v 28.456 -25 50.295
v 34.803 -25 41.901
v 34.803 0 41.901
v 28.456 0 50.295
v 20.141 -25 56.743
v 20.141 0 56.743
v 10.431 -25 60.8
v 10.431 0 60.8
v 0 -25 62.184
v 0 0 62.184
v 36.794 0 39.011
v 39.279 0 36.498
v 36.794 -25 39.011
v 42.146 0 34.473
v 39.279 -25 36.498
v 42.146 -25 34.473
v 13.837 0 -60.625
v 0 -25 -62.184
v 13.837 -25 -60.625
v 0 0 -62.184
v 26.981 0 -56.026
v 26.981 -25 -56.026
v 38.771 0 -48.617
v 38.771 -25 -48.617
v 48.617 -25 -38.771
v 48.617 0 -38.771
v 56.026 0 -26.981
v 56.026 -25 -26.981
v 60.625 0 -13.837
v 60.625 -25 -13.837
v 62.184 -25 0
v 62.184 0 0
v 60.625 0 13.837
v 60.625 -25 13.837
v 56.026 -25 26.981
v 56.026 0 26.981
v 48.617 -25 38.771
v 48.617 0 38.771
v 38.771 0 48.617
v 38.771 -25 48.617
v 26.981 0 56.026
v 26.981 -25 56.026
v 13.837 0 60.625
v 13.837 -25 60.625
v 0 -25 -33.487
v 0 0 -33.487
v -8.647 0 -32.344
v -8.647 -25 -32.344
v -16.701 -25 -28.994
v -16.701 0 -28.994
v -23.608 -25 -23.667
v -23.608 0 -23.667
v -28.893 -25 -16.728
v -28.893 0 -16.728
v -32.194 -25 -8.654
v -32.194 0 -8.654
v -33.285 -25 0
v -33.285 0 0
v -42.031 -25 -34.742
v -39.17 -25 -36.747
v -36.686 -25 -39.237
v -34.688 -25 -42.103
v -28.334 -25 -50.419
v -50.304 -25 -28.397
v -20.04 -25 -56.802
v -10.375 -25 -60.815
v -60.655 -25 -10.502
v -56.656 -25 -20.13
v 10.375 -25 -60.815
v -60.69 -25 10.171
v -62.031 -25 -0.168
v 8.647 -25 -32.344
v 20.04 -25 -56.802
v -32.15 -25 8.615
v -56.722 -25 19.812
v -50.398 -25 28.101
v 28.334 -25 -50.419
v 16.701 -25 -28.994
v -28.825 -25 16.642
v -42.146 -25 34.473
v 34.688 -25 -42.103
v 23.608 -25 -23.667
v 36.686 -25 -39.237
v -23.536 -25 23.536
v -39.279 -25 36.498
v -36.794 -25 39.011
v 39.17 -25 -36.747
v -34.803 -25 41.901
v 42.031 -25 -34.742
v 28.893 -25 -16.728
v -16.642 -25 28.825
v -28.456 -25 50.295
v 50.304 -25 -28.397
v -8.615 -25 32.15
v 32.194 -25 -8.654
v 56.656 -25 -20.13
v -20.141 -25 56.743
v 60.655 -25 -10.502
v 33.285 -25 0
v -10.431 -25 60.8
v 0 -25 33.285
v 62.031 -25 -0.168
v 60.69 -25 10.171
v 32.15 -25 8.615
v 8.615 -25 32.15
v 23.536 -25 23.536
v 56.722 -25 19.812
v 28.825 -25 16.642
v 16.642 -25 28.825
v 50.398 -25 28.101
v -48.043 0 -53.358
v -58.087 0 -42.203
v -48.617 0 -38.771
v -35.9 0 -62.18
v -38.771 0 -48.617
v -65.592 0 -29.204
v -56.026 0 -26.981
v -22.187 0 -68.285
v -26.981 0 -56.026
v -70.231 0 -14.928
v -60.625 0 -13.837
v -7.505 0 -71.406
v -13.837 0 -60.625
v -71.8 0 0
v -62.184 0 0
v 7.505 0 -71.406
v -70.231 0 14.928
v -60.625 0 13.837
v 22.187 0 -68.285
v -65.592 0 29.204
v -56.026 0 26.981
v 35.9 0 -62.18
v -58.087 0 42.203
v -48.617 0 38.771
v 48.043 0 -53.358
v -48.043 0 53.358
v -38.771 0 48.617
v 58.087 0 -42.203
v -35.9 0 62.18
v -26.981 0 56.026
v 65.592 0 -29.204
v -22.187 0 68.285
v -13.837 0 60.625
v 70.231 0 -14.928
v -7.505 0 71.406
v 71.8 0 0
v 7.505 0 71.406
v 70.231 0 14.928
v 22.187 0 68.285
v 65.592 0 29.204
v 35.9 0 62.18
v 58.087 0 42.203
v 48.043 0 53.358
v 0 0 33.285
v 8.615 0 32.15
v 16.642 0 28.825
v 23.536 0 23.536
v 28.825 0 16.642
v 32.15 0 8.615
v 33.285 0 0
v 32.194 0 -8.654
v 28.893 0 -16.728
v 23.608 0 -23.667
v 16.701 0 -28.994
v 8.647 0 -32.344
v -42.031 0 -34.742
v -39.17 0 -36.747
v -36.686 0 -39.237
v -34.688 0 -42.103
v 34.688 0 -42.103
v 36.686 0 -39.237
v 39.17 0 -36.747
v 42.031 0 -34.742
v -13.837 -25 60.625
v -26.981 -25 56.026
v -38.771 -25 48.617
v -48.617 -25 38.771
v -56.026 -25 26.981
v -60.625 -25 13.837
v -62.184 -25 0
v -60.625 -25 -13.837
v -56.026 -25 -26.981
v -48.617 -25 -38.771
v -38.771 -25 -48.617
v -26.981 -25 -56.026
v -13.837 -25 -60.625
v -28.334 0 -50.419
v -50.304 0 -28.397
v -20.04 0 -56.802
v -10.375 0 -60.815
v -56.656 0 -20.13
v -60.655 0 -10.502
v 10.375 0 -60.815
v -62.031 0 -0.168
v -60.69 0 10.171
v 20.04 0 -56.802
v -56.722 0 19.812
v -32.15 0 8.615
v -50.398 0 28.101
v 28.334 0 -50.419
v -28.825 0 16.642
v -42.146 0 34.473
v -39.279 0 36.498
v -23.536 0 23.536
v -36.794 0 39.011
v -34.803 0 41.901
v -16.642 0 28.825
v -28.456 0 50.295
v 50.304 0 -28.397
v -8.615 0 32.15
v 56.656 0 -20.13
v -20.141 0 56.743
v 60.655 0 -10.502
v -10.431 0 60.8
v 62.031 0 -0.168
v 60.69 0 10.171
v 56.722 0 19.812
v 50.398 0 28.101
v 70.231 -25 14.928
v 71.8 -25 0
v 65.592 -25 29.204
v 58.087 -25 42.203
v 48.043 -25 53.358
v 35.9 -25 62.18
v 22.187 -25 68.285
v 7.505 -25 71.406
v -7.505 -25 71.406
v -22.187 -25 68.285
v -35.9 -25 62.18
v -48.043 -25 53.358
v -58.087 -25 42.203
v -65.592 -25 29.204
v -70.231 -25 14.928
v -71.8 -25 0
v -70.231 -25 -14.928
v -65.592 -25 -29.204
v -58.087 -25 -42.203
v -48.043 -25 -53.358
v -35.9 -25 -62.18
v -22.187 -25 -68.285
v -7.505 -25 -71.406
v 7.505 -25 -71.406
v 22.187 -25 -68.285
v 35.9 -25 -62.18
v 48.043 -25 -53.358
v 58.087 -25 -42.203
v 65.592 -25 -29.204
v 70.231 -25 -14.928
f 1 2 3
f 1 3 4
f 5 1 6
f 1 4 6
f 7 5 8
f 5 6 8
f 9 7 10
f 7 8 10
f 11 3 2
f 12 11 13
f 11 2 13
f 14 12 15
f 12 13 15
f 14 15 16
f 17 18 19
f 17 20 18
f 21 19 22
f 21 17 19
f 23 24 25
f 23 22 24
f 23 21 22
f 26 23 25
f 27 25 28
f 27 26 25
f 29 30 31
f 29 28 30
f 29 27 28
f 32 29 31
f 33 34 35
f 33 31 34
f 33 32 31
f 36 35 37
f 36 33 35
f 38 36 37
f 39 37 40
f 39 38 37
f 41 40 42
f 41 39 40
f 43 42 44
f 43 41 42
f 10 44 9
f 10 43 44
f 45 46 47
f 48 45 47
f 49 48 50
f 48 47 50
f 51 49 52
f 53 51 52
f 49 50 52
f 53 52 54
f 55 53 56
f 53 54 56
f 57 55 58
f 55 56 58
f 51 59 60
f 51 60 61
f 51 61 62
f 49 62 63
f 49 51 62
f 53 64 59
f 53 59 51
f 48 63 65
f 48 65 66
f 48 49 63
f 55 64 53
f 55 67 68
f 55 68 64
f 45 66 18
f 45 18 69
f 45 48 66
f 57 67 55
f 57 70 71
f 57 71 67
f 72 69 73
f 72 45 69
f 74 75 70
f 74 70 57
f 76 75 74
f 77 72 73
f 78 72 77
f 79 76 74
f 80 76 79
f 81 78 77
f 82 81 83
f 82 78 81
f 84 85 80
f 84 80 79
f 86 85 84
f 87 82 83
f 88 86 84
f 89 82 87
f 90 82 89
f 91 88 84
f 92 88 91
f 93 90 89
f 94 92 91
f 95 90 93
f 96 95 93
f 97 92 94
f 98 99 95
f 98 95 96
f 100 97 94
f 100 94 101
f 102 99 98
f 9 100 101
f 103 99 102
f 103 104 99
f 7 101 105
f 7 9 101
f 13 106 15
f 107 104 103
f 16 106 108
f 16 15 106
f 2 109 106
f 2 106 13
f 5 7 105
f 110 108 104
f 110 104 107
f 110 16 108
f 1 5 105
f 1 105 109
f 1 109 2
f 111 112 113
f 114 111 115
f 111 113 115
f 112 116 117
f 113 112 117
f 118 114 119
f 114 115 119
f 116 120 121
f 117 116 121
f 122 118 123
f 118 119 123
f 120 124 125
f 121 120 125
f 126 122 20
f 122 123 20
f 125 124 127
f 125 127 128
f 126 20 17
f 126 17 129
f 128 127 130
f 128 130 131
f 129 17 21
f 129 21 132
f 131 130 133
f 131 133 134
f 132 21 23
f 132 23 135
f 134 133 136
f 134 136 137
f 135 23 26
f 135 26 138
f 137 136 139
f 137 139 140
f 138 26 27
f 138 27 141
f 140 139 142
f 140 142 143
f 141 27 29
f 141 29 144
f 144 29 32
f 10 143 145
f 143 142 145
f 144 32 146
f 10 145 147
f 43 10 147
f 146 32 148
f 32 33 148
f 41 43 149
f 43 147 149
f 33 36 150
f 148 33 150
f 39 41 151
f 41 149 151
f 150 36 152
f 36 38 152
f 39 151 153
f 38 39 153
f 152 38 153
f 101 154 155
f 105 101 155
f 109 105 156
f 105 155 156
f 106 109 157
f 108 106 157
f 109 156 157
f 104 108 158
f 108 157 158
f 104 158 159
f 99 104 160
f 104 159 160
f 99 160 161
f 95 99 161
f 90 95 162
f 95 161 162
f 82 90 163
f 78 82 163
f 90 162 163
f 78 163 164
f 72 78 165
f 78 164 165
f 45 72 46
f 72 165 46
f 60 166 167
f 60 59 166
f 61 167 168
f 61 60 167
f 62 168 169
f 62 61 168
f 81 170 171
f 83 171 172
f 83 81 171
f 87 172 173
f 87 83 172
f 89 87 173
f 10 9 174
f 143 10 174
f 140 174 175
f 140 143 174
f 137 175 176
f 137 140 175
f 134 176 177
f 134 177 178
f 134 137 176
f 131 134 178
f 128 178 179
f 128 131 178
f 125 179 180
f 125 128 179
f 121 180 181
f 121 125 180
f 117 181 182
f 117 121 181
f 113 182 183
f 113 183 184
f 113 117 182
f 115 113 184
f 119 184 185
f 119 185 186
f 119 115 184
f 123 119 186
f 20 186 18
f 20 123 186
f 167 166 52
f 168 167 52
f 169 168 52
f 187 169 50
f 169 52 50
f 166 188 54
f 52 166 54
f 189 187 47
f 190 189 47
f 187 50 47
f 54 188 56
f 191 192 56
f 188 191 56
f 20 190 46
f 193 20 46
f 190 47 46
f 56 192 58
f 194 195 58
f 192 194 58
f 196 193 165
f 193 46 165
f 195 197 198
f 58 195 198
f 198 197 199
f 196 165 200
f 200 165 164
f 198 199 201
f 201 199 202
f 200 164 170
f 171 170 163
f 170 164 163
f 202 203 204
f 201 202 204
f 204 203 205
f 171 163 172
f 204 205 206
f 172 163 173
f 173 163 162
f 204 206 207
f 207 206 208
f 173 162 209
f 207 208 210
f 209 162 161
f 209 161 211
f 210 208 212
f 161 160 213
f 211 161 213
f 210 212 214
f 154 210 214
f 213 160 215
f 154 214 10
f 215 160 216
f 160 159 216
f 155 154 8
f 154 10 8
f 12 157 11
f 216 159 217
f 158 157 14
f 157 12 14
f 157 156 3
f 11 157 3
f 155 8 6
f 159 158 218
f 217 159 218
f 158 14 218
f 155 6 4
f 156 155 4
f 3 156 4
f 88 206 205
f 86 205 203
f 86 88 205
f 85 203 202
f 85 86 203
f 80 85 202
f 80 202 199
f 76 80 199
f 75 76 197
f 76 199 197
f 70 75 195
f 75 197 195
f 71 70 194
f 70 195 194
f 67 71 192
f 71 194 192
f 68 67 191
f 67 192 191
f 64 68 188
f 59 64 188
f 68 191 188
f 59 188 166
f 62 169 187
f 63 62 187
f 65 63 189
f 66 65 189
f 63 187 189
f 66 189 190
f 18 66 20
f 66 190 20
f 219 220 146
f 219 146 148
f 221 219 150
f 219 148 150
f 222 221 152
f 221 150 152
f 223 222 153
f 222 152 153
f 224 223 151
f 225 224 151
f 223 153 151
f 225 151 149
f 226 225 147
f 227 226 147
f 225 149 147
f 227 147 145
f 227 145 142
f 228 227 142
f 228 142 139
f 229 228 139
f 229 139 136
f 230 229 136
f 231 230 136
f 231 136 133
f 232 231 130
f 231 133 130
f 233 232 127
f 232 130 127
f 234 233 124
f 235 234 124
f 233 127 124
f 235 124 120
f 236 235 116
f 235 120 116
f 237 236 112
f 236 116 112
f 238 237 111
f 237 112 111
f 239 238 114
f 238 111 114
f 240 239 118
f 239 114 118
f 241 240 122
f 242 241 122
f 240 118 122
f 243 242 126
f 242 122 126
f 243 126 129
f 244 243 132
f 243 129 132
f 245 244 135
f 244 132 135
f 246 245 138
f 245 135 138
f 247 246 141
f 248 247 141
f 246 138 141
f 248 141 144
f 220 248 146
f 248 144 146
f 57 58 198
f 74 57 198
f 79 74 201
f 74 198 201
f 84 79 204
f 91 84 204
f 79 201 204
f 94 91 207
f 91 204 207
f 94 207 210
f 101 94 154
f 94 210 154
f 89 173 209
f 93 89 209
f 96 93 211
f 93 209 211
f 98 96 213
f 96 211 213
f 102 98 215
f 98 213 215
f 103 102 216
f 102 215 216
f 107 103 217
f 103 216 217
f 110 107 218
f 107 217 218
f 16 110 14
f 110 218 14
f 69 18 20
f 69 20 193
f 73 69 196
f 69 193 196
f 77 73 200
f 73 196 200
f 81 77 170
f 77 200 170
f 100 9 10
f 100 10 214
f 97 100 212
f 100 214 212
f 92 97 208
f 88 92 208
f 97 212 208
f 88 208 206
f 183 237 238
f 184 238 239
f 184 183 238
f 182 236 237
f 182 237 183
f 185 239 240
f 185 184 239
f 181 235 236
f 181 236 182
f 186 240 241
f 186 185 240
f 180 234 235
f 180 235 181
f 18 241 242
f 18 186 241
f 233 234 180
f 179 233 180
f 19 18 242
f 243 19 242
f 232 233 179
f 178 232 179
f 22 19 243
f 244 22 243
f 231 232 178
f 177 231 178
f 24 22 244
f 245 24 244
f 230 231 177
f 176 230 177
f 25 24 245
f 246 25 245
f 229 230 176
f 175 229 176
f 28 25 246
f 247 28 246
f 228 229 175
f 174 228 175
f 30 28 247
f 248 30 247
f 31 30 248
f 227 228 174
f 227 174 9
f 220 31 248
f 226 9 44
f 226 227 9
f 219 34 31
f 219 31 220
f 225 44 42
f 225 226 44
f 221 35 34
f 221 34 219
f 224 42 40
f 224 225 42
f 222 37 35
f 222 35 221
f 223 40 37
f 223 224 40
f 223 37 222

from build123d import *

# Parameters (mm, degrees)
F1_DEPTH = 25
F2_R     = 20
F3_R     = 71.7996081042
F3_R_2   = 62.1840589354
F4_DEPTH = 25


with BuildPart() as f1:
    # F0 (on Front) → F1 (new body)
    with BuildSketch(Plane.XZ):
        with BuildLine():
            ThreePointArc((37.0915824755, -37.1578530257), (39.7917054819, -18.10727407), (33.2846440443, 0))
            ThreePointArc((33.2846440443, 0), (23.6075322928, -23.6666891703), (0, -33.4872333087))
            ThreePointArc((0, -33.4872333087), (18.0921230956, -39.9068560653), (37.0915824755, -37.1578530257))
        make_face()
        with BuildLine():
            ThreePointArc((0, 33.2846440443), (23.5357975131, 23.5357975131), (33.2846440443, 0))
            ThreePointArc((33.2846440443, 0), (39.7782077768, 17.977613159), (37.1883942733, 36.915770695))
            ThreePointArc((37.1883942733, 36.915770695), (18.1441509794, 39.7093812016), (0, 33.2846440443))
        make_face()
        with BuildLine():
            ThreePointArc((37.1883942733, 36.915770695), (39.7782077768, 17.977613159), (33.2846440443, 0))
            ThreePointArc((33.2846440443, 0), (39.7917054819, -18.10727407), (37.0915824755, -37.1578530257))
            ThreePointArc((37.0915824755, -37.1578530257), (62.0312866935, -0.1535732762), (37.1883942733, 36.915770695))
        make_face()
        with BuildLine():
            ThreePointArc((-37.1883942733, 36.915770695), (-18.1441509794, 39.7093812016), (0, 33.2846440443))
            ThreePointArc((0, 33.2846440443), (18.1441509794, 39.7093812016), (37.1883942733, 36.915770695))
            ThreePointArc((37.1883942733, 36.915770695), (0, 62.1840589354), (-37.1883942733, 36.915770695))
        make_face()
        with BuildLine():
            ThreePointArc((-33.2846440443, 0), (-23.5357975131, 23.5357975131), (0, 33.2846440443))
            ThreePointArc((0, 33.2846440443), (-18.1441509794, 39.7093812016), (-37.1883942733, 36.915770695))
            ThreePointArc((-37.1883942733, 36.915770695), (-39.7782077768, 17.977613159), (-33.2846440443, 0))
        make_face()
        with BuildLine():
            ThreePointArc((-37.0915824755, -37.1578530257), (-18.0921230956, -39.9068560653), (0, -33.4872333087))
            ThreePointArc((0, -33.4872333087), (-23.6075322928, -23.6666891703), (-33.2846440443, 0))
            ThreePointArc((-33.2846440443, 0), (-39.7917054819, -18.10727407), (-37.0915824755, -37.1578530257))
        make_face()
        with BuildLine():
            ThreePointArc((37.0915824755, -37.1578530257), (18.0921230956, -39.9068560653), (0, -33.4872333087))
            ThreePointArc((0, -33.4872333087), (-18.0921230956, -39.9068560653), (-37.0915824755, -37.1578530257))
            ThreePointArc((-37.0915824755, -37.1578530257), (0, -62.1840589354), (37.0915824755, -37.1578530257))
        make_face()
        with BuildLine():
            ThreePointArc((-37.0915824755, -37.1578530257), (-39.7917054819, -18.10727407), (-33.2846440443, 0))
            ThreePointArc((-33.2846440443, 0), (-39.7782077768, 17.977613159), (-37.1883942733, 36.915770695))
            ThreePointArc((-37.1883942733, 36.915770695), (-62.0312866935, -0.1535732762), (-37.0915824755, -37.1578530257))
        make_face()
    extrude(amount=F1_DEPTH)

    # F2
    f2_edges = [f1.edges().sort_by_distance(p)[0] for p in [
        (-37.188394, -12.5, 36.915771),
        (37.188394, -12.5, 36.915771),
        (37.091582, -12.5, -37.157853),
        (-37.091582, -12.5, -37.157853),
    ]]
    fillet(f2_edges, radius=F2_R)

    # F3 (on Front) → F4 (join)
    with BuildSketch(Plane.XZ):
        Circle(F3_R)
        Circle(F3_R_2, mode=Mode.SUBTRACT)
    extrude(amount=F4_DEPTH)


solid = f1.part
